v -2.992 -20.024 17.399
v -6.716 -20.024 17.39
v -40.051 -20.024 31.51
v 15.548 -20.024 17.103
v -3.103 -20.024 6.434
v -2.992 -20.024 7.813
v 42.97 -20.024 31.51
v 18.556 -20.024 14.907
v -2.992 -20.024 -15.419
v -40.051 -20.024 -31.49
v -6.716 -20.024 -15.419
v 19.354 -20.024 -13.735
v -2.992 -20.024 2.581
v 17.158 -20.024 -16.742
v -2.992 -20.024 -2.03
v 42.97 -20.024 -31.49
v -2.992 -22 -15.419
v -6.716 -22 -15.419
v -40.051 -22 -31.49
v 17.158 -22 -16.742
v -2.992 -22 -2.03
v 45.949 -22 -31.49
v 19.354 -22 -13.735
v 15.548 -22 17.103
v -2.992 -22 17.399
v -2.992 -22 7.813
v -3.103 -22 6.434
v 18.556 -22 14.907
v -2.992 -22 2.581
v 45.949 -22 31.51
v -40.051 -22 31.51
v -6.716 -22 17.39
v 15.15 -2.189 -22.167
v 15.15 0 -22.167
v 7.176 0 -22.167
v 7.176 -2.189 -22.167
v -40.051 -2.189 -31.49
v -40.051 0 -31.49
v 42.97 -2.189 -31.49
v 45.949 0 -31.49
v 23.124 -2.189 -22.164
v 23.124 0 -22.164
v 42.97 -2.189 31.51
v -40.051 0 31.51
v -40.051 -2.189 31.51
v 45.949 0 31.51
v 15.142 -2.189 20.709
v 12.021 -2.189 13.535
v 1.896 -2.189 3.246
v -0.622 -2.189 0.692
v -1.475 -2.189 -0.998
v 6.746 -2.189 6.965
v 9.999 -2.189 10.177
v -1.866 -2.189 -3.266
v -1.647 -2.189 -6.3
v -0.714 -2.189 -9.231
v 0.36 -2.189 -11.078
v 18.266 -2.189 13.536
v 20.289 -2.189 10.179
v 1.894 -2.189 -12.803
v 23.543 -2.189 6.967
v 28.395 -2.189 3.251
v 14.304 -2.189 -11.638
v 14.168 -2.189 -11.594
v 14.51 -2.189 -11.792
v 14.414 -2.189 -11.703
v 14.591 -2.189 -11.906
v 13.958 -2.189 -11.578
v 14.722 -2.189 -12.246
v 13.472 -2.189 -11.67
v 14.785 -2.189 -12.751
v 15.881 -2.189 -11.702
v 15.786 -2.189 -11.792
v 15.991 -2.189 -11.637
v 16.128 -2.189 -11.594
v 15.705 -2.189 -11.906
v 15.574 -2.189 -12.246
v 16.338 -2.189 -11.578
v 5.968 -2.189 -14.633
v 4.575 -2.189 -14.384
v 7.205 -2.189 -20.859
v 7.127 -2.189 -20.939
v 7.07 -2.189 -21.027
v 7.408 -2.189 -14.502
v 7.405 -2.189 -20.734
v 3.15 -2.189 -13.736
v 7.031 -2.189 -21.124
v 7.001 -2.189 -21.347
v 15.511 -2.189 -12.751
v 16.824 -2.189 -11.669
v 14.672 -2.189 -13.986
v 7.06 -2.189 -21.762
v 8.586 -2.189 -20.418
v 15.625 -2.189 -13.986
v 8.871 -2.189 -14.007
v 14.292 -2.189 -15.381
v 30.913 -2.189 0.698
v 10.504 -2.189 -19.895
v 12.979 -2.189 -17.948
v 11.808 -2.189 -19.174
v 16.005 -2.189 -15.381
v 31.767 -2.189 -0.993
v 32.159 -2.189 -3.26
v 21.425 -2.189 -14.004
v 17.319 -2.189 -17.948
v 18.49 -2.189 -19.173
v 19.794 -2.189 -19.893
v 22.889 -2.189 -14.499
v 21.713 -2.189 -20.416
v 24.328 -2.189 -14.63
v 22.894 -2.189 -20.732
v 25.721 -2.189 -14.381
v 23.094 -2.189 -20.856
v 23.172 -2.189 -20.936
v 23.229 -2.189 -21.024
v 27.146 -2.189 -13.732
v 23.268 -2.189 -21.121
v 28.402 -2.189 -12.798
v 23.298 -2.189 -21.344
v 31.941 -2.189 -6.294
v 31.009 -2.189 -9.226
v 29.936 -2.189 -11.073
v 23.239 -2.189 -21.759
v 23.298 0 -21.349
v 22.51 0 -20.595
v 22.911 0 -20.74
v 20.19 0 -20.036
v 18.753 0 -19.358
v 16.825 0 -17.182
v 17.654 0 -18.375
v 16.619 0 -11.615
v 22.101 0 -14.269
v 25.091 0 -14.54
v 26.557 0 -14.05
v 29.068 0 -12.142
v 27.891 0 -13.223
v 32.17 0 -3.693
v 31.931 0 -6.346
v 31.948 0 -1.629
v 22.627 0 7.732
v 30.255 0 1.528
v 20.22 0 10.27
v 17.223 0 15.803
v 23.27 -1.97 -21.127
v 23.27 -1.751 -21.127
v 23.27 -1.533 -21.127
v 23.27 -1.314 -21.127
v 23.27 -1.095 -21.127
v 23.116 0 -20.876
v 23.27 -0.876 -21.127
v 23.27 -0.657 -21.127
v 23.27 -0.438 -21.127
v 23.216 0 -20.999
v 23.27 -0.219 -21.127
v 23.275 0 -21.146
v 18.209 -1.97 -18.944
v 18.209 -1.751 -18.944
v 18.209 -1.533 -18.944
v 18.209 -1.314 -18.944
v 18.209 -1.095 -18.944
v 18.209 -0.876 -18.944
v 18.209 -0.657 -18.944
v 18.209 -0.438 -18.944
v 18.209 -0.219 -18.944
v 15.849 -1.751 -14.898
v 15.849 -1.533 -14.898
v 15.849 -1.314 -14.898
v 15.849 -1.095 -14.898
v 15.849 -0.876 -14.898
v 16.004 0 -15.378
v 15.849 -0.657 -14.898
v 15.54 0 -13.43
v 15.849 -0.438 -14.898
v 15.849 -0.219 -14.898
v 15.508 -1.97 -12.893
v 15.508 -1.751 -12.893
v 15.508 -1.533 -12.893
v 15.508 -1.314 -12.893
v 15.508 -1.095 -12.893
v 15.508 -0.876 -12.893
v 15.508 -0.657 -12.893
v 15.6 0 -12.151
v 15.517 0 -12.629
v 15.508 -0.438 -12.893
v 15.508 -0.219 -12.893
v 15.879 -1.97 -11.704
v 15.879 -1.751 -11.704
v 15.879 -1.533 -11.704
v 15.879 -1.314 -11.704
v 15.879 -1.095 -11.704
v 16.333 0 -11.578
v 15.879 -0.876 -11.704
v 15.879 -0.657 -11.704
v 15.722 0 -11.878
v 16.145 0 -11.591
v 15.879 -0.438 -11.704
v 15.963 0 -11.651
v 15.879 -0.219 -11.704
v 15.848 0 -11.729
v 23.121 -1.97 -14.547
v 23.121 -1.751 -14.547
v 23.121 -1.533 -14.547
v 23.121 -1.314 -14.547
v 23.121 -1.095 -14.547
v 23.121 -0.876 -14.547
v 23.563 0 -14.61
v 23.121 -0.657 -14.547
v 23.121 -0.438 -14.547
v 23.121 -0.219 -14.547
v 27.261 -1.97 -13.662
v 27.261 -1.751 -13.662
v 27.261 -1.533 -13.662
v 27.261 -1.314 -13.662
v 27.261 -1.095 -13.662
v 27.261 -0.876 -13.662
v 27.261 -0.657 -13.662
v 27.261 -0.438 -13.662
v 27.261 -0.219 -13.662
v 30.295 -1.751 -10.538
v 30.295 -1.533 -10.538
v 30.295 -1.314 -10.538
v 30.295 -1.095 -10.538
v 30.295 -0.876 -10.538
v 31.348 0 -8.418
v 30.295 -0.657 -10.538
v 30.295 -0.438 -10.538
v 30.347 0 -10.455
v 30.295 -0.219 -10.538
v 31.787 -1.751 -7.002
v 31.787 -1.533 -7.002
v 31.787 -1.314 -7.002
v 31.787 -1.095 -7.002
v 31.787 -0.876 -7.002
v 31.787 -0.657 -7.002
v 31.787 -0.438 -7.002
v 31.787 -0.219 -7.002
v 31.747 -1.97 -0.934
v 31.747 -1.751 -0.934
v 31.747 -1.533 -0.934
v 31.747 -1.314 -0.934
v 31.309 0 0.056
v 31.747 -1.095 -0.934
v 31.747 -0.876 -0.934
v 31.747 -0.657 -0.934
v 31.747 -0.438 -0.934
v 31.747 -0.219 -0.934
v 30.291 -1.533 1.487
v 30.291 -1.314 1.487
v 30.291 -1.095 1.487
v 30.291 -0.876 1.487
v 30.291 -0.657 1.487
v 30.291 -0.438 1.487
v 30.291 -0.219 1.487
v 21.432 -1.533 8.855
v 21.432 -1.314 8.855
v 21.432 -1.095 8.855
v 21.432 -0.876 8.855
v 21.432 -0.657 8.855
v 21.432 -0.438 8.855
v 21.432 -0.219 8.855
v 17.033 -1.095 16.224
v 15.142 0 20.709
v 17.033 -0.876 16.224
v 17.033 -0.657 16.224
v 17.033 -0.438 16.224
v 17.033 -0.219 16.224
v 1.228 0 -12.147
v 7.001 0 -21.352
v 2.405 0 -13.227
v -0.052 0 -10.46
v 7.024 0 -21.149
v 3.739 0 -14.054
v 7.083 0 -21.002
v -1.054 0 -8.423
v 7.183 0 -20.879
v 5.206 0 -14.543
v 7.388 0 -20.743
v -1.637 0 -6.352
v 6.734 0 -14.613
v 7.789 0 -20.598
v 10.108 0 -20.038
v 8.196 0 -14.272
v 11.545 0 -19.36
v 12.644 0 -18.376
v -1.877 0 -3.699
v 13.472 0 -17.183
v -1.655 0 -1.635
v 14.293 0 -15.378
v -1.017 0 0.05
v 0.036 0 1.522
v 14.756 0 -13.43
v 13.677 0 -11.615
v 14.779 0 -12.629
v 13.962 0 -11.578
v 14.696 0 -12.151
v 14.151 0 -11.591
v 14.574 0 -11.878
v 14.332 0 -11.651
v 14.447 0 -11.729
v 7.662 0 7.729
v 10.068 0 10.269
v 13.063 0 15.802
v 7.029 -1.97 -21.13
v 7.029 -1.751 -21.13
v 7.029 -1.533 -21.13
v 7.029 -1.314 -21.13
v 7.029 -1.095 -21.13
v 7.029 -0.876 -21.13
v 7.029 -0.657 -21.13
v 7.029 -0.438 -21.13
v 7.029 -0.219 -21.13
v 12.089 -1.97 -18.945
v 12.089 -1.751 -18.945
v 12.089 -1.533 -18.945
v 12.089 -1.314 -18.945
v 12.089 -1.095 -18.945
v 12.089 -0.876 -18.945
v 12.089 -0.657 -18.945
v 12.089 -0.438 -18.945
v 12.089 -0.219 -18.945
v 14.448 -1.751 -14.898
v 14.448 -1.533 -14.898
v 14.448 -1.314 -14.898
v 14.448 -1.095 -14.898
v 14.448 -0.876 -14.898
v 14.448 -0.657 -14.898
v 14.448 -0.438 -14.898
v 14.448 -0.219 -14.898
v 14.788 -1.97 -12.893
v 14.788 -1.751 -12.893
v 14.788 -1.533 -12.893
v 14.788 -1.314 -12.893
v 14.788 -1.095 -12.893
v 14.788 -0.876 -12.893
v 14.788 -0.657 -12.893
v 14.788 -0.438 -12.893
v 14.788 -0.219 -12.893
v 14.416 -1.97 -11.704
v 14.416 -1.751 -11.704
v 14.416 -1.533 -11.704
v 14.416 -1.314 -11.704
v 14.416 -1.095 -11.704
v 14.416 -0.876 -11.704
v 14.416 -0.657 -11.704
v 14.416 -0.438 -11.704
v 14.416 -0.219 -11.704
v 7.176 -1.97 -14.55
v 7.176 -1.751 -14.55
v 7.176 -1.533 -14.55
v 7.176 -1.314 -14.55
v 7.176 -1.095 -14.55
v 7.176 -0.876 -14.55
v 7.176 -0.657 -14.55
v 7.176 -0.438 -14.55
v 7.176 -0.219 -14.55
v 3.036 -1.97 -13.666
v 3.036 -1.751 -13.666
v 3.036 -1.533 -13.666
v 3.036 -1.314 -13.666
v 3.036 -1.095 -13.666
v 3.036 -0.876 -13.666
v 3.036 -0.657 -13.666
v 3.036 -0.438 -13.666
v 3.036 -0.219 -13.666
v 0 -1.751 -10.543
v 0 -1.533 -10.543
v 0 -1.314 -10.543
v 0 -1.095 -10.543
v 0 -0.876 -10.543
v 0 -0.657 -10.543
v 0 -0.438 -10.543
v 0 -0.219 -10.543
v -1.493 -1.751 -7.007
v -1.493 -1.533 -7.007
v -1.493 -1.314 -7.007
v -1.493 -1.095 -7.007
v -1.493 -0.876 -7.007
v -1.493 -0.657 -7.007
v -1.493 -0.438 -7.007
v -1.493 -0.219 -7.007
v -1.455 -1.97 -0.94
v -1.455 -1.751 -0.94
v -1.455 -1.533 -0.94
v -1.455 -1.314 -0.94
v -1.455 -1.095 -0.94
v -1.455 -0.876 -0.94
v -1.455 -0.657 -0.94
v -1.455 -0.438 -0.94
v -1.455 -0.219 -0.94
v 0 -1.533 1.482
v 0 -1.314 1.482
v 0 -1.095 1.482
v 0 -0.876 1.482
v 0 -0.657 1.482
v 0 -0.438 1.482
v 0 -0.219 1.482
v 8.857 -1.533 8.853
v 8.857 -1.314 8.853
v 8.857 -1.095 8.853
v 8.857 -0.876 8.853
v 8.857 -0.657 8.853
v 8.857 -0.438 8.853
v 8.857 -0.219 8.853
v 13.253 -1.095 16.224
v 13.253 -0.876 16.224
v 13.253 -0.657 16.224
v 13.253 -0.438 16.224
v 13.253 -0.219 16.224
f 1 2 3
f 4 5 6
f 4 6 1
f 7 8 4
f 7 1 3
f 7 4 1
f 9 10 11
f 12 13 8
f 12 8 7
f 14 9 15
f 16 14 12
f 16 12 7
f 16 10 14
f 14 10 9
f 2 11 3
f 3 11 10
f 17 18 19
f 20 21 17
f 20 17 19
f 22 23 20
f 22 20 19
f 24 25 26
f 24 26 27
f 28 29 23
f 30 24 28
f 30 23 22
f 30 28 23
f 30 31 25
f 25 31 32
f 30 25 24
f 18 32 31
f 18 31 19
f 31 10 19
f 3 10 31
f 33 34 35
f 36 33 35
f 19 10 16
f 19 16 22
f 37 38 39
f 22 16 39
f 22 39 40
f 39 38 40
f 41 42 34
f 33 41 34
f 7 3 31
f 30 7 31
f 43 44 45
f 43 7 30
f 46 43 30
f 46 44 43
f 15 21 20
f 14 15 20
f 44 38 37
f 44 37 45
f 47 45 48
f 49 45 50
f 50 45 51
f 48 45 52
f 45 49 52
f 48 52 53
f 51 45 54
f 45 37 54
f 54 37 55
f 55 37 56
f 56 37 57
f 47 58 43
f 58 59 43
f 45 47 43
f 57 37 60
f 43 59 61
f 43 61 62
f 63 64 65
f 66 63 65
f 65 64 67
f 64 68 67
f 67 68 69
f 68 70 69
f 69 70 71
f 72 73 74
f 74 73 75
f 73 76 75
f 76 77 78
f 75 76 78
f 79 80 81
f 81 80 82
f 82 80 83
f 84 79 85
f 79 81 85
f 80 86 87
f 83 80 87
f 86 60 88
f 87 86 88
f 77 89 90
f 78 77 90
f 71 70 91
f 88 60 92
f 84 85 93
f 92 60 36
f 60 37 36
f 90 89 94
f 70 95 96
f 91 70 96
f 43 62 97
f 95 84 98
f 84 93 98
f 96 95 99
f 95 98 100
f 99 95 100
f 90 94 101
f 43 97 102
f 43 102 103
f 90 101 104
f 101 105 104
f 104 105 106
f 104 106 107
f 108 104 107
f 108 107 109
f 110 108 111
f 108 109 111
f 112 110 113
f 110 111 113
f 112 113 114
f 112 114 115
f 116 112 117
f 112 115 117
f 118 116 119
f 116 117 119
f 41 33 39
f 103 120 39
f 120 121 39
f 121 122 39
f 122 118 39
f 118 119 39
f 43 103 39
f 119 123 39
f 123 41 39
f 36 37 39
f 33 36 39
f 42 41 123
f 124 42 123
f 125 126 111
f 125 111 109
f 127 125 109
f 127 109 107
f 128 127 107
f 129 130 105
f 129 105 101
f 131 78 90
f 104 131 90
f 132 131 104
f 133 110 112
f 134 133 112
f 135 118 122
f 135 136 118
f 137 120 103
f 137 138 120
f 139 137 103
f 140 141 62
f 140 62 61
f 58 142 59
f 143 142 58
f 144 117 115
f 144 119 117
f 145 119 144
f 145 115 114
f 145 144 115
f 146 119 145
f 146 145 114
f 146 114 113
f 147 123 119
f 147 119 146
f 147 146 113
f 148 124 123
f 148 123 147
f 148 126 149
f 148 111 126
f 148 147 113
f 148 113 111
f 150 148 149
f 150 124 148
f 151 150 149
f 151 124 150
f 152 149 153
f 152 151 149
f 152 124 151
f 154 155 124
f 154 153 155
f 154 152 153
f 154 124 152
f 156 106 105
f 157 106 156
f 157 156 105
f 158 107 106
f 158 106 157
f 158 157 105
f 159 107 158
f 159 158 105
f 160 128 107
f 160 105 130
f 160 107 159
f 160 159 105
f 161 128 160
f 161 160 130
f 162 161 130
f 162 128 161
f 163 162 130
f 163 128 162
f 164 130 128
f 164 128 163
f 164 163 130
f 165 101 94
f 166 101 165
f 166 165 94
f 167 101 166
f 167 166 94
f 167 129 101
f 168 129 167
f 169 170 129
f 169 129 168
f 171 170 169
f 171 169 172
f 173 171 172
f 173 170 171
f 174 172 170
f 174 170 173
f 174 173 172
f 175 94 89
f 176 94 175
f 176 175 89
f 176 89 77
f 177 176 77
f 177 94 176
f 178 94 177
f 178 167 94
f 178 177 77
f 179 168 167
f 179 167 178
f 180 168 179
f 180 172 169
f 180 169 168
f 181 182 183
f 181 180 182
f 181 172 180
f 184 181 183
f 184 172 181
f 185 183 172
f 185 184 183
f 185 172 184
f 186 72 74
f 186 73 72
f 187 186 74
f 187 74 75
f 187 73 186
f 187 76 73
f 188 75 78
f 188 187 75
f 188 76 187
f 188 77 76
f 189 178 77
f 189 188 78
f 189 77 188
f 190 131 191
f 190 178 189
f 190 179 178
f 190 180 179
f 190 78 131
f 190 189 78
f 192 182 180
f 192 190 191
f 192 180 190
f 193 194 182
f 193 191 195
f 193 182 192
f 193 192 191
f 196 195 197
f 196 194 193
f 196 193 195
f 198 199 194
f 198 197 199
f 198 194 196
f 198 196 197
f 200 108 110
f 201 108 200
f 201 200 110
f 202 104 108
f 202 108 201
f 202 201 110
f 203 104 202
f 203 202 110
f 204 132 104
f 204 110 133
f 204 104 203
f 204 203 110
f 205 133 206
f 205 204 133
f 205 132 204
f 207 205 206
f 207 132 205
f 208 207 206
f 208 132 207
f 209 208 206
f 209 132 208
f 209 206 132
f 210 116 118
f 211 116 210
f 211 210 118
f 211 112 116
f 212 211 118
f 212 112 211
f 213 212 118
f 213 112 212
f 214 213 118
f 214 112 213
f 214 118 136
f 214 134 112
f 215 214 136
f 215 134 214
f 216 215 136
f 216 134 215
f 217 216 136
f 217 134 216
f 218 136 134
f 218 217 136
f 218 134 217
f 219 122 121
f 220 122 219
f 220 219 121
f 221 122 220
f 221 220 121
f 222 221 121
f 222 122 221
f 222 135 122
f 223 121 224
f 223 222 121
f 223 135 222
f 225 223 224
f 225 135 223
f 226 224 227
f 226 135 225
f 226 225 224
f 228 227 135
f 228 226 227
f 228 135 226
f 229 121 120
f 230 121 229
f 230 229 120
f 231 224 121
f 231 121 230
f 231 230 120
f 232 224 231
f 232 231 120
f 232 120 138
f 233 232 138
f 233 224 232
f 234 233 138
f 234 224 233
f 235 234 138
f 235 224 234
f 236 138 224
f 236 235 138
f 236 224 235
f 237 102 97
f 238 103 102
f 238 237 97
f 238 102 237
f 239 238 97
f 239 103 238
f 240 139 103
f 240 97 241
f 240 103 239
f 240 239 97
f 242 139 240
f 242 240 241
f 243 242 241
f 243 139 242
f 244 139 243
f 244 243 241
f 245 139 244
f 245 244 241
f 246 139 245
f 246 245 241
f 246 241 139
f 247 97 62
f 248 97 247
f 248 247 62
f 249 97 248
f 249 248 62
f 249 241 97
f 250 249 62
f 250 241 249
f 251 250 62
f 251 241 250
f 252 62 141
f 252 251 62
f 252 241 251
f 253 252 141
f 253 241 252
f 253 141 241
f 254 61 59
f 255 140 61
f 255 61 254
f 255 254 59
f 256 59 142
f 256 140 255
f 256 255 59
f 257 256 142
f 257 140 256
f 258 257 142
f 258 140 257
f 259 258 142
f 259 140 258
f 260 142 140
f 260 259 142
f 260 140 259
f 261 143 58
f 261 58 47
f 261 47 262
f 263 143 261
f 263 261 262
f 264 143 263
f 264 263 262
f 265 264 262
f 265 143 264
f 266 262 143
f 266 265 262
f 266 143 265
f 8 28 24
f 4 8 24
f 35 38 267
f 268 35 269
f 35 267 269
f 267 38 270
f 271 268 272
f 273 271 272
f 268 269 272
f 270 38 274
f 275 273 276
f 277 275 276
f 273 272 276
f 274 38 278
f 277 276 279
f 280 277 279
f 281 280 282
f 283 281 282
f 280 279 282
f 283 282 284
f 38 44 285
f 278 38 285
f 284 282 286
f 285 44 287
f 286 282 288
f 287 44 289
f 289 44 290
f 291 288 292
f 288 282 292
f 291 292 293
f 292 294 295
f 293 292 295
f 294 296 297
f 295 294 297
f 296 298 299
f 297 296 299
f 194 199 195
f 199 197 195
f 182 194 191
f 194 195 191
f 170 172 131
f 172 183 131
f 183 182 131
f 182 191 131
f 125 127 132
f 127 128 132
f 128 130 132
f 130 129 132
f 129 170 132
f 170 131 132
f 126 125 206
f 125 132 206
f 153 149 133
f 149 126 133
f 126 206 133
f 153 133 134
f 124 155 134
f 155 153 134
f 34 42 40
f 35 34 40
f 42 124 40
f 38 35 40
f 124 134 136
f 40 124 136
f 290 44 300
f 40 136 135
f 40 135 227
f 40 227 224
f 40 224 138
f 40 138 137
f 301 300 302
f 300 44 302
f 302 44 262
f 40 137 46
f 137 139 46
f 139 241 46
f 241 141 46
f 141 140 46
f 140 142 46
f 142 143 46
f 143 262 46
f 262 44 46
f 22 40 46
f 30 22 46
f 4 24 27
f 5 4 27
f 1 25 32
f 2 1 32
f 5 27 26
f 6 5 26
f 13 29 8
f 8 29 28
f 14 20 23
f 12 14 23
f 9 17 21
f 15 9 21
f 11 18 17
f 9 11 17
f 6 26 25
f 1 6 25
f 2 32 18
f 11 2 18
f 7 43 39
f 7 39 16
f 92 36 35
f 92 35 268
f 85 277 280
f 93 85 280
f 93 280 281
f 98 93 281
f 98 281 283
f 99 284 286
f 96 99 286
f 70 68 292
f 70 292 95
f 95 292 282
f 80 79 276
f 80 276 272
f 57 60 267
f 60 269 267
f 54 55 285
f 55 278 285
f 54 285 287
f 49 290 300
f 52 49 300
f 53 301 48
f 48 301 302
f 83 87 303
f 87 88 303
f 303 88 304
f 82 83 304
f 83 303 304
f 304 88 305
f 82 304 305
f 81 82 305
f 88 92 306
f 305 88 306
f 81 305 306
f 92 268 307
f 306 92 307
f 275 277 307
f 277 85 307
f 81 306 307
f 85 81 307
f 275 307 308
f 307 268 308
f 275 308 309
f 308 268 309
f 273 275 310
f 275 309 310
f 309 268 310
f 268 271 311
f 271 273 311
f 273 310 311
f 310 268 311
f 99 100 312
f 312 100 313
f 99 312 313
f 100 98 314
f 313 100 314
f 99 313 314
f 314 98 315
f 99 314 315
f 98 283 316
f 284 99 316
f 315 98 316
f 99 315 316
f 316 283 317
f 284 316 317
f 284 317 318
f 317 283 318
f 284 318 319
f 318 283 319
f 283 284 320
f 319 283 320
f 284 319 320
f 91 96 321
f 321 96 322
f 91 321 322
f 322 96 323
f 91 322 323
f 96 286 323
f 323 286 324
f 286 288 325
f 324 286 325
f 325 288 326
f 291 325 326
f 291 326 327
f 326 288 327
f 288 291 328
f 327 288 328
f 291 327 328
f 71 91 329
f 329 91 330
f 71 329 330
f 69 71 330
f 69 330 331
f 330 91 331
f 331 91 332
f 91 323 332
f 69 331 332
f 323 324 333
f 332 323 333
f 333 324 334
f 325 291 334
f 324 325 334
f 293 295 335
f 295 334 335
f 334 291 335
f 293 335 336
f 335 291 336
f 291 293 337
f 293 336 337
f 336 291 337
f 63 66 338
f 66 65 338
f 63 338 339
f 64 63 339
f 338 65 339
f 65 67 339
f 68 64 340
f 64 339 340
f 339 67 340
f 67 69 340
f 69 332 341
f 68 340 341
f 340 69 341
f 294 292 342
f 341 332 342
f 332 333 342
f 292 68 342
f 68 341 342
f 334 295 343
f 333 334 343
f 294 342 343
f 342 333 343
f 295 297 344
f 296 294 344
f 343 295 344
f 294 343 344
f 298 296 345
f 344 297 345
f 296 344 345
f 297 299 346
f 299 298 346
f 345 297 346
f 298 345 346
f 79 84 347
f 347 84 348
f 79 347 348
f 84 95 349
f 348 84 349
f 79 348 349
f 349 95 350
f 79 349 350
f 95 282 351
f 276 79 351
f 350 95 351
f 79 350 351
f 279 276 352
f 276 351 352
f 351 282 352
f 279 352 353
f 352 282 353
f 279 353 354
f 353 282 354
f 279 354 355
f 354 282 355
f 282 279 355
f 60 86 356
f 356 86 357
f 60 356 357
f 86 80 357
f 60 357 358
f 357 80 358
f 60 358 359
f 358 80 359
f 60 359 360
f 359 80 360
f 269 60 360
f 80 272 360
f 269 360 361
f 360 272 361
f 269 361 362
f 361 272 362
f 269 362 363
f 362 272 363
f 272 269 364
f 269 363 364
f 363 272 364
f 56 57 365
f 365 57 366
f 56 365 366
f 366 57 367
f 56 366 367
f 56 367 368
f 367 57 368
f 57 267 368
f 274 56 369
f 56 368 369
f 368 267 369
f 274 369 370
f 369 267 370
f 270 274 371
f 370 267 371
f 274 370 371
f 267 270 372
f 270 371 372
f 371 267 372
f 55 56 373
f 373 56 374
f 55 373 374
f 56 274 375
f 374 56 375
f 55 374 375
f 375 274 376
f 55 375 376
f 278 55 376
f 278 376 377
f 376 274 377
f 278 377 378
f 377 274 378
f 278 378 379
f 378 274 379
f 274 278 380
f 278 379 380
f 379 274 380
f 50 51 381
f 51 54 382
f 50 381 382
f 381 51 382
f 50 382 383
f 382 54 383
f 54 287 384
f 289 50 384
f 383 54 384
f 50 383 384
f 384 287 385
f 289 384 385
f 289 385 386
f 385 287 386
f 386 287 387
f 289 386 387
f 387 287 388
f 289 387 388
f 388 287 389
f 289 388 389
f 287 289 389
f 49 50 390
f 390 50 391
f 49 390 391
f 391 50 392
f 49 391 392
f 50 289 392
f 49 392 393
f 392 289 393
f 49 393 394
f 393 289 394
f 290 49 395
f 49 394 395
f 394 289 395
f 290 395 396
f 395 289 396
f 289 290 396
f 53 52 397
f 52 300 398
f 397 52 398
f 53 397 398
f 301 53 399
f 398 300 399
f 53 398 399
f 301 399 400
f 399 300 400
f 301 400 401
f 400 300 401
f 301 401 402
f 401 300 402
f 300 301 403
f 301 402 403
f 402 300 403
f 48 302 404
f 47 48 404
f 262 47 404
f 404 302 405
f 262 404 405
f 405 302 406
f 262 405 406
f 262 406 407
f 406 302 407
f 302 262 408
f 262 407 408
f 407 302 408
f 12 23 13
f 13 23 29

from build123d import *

# Parameters (mm, degrees)
F0_W     = 86
F0_H     = 63
F1_DEPTH = 22
F2_W     = 83.021147579
F2_H     = 17.8350203205
F3_DEPTH = 76.2
F5_DEPTH = 12.7
F7_DEPTH = 12.7


with BuildPart() as f1:
    # F0 (on Front) → F1 (new body)
    with BuildSketch(Plane.XZ):
        with Locations((2.9492415488, 0.0097374022)):
            Rectangle(F0_W, F0_H)
    extrude(amount=F1_DEPTH)

    # F2 (on face) → F3 (cut)
    with BuildSketch(Plane(origin=(0, 0, -31.4902625978), x_dir=(1, 0, 0), z_dir=(0, 0, -1))):
        with Locations((1.4598153383, 11.1068621045)):
            Rectangle(F2_W, F2_H)
    extrude(amount=-F3_DEPTH, mode=Mode.SUBTRACT)

    # F4 (on face) → F5 (cut)
    with BuildSketch(Plane(origin=(0, 0, 0), x_dir=(-1, 0, 0), z_dir=(0, 1, 0))):
        with BuildLine():
            Line((-15.1422635311, 20.7094521857), (-15.1496560163, -22.1666304386))
            Line((-15.1496560163, -22.1666304386), (-7.1757626719, -22.1666304386))
            add(Edge.make_bspline(
                [(-7.1757626719, -22.1666304386), (-7.0240950899, -21.6717555888), (-6.5645020254, -20.1721533291), (-13.2724247258, -20.8311956332), (-16.6301221041, -7.869487451), (-6.7285296104, -17.1810672319), (0.9325573177, -10.9730690732), (2.3276751638, -3.5292990134), (0.7999525604, 2.1969793638), (-9.9095984878, 8.2465186729), (-12.7862686807, 15.3709459047), (-14.9244065918, 19.8043070968), (-15.1422635311, 20.7094521857)],
                knots=[0, 0, 0, 0, 0.0427686987, 0.1296005186, 0.2337922012, 0.3391684873, 0.4474772409, 0.5490562859, 0.6366862886, 0.7649319301, 0.8756085159, 0.9518034851, 0.9518034851, 0.9518034851, 0.9518034851], degree=3))
        make_face()
        with BuildLine():
            Line((-23.1235488865, -22.163880799), (-15.1496560163, -22.1666304386))
            Line((-15.1496560163, -22.1666304386), (-15.1422635311, 20.7094521857))
            add(Edge.make_bspline(
                [(-23.1235488865, -22.163880799), (-23.2750458117, -21.6689536791), (-23.7341217407, -20.169193027), (-17.0264266968, -20.8305483864), (-13.6642599292, -7.8699988105), (-23.5690627485, -17.1781636693), (-31.2280085156, -10.9675241051), (-32.6205594418, -3.5232734091), (-31.0908623351, 2.2024778227), (-20.3792258596, 8.248323795), (-17.5000991197, 15.3717586404), (-15.3604325788, 19.8043822742), (-15.1422635311, 20.7094521857)],
                knots=[0, 0, 0, 0, 0.0427686987, 0.1296005186, 0.2337922012, 0.3391684873, 0.4474772409, 0.5490562859, 0.6366862886, 0.7649319301, 0.8756085159, 0.9518034851, 0.9518034851, 0.9518034851, 0.9518034851], degree=3))
        make_face()
    extrude(amount=-F5_DEPTH, mode=Mode.SUBTRACT)

    # F6 (on face) → F7 (cut)
    with BuildSketch(Plane.XZ.offset(22)):
        Polygon((-2.9918444343, 17.3992476049), (-6.7161070183, 17.3896308988), (-6.7161070183, -15.419350937), (-2.9918444343, -15.419350937), (-2.9918444343, -2.0301223486), (17.1575445901, -16.742385438), (19.3537324667, -13.7345651165), (-2.9918444343, 2.5812648997), (18.5556765646, 14.9067891762), (15.5478562431, 17.1029770527), (-3.1033871576, 6.4341695674), (-2.9918444343, 7.8129554167), align=None)
    extrude(amount=-F7_DEPTH, mode=Mode.SUBTRACT)


solid = f1.part
